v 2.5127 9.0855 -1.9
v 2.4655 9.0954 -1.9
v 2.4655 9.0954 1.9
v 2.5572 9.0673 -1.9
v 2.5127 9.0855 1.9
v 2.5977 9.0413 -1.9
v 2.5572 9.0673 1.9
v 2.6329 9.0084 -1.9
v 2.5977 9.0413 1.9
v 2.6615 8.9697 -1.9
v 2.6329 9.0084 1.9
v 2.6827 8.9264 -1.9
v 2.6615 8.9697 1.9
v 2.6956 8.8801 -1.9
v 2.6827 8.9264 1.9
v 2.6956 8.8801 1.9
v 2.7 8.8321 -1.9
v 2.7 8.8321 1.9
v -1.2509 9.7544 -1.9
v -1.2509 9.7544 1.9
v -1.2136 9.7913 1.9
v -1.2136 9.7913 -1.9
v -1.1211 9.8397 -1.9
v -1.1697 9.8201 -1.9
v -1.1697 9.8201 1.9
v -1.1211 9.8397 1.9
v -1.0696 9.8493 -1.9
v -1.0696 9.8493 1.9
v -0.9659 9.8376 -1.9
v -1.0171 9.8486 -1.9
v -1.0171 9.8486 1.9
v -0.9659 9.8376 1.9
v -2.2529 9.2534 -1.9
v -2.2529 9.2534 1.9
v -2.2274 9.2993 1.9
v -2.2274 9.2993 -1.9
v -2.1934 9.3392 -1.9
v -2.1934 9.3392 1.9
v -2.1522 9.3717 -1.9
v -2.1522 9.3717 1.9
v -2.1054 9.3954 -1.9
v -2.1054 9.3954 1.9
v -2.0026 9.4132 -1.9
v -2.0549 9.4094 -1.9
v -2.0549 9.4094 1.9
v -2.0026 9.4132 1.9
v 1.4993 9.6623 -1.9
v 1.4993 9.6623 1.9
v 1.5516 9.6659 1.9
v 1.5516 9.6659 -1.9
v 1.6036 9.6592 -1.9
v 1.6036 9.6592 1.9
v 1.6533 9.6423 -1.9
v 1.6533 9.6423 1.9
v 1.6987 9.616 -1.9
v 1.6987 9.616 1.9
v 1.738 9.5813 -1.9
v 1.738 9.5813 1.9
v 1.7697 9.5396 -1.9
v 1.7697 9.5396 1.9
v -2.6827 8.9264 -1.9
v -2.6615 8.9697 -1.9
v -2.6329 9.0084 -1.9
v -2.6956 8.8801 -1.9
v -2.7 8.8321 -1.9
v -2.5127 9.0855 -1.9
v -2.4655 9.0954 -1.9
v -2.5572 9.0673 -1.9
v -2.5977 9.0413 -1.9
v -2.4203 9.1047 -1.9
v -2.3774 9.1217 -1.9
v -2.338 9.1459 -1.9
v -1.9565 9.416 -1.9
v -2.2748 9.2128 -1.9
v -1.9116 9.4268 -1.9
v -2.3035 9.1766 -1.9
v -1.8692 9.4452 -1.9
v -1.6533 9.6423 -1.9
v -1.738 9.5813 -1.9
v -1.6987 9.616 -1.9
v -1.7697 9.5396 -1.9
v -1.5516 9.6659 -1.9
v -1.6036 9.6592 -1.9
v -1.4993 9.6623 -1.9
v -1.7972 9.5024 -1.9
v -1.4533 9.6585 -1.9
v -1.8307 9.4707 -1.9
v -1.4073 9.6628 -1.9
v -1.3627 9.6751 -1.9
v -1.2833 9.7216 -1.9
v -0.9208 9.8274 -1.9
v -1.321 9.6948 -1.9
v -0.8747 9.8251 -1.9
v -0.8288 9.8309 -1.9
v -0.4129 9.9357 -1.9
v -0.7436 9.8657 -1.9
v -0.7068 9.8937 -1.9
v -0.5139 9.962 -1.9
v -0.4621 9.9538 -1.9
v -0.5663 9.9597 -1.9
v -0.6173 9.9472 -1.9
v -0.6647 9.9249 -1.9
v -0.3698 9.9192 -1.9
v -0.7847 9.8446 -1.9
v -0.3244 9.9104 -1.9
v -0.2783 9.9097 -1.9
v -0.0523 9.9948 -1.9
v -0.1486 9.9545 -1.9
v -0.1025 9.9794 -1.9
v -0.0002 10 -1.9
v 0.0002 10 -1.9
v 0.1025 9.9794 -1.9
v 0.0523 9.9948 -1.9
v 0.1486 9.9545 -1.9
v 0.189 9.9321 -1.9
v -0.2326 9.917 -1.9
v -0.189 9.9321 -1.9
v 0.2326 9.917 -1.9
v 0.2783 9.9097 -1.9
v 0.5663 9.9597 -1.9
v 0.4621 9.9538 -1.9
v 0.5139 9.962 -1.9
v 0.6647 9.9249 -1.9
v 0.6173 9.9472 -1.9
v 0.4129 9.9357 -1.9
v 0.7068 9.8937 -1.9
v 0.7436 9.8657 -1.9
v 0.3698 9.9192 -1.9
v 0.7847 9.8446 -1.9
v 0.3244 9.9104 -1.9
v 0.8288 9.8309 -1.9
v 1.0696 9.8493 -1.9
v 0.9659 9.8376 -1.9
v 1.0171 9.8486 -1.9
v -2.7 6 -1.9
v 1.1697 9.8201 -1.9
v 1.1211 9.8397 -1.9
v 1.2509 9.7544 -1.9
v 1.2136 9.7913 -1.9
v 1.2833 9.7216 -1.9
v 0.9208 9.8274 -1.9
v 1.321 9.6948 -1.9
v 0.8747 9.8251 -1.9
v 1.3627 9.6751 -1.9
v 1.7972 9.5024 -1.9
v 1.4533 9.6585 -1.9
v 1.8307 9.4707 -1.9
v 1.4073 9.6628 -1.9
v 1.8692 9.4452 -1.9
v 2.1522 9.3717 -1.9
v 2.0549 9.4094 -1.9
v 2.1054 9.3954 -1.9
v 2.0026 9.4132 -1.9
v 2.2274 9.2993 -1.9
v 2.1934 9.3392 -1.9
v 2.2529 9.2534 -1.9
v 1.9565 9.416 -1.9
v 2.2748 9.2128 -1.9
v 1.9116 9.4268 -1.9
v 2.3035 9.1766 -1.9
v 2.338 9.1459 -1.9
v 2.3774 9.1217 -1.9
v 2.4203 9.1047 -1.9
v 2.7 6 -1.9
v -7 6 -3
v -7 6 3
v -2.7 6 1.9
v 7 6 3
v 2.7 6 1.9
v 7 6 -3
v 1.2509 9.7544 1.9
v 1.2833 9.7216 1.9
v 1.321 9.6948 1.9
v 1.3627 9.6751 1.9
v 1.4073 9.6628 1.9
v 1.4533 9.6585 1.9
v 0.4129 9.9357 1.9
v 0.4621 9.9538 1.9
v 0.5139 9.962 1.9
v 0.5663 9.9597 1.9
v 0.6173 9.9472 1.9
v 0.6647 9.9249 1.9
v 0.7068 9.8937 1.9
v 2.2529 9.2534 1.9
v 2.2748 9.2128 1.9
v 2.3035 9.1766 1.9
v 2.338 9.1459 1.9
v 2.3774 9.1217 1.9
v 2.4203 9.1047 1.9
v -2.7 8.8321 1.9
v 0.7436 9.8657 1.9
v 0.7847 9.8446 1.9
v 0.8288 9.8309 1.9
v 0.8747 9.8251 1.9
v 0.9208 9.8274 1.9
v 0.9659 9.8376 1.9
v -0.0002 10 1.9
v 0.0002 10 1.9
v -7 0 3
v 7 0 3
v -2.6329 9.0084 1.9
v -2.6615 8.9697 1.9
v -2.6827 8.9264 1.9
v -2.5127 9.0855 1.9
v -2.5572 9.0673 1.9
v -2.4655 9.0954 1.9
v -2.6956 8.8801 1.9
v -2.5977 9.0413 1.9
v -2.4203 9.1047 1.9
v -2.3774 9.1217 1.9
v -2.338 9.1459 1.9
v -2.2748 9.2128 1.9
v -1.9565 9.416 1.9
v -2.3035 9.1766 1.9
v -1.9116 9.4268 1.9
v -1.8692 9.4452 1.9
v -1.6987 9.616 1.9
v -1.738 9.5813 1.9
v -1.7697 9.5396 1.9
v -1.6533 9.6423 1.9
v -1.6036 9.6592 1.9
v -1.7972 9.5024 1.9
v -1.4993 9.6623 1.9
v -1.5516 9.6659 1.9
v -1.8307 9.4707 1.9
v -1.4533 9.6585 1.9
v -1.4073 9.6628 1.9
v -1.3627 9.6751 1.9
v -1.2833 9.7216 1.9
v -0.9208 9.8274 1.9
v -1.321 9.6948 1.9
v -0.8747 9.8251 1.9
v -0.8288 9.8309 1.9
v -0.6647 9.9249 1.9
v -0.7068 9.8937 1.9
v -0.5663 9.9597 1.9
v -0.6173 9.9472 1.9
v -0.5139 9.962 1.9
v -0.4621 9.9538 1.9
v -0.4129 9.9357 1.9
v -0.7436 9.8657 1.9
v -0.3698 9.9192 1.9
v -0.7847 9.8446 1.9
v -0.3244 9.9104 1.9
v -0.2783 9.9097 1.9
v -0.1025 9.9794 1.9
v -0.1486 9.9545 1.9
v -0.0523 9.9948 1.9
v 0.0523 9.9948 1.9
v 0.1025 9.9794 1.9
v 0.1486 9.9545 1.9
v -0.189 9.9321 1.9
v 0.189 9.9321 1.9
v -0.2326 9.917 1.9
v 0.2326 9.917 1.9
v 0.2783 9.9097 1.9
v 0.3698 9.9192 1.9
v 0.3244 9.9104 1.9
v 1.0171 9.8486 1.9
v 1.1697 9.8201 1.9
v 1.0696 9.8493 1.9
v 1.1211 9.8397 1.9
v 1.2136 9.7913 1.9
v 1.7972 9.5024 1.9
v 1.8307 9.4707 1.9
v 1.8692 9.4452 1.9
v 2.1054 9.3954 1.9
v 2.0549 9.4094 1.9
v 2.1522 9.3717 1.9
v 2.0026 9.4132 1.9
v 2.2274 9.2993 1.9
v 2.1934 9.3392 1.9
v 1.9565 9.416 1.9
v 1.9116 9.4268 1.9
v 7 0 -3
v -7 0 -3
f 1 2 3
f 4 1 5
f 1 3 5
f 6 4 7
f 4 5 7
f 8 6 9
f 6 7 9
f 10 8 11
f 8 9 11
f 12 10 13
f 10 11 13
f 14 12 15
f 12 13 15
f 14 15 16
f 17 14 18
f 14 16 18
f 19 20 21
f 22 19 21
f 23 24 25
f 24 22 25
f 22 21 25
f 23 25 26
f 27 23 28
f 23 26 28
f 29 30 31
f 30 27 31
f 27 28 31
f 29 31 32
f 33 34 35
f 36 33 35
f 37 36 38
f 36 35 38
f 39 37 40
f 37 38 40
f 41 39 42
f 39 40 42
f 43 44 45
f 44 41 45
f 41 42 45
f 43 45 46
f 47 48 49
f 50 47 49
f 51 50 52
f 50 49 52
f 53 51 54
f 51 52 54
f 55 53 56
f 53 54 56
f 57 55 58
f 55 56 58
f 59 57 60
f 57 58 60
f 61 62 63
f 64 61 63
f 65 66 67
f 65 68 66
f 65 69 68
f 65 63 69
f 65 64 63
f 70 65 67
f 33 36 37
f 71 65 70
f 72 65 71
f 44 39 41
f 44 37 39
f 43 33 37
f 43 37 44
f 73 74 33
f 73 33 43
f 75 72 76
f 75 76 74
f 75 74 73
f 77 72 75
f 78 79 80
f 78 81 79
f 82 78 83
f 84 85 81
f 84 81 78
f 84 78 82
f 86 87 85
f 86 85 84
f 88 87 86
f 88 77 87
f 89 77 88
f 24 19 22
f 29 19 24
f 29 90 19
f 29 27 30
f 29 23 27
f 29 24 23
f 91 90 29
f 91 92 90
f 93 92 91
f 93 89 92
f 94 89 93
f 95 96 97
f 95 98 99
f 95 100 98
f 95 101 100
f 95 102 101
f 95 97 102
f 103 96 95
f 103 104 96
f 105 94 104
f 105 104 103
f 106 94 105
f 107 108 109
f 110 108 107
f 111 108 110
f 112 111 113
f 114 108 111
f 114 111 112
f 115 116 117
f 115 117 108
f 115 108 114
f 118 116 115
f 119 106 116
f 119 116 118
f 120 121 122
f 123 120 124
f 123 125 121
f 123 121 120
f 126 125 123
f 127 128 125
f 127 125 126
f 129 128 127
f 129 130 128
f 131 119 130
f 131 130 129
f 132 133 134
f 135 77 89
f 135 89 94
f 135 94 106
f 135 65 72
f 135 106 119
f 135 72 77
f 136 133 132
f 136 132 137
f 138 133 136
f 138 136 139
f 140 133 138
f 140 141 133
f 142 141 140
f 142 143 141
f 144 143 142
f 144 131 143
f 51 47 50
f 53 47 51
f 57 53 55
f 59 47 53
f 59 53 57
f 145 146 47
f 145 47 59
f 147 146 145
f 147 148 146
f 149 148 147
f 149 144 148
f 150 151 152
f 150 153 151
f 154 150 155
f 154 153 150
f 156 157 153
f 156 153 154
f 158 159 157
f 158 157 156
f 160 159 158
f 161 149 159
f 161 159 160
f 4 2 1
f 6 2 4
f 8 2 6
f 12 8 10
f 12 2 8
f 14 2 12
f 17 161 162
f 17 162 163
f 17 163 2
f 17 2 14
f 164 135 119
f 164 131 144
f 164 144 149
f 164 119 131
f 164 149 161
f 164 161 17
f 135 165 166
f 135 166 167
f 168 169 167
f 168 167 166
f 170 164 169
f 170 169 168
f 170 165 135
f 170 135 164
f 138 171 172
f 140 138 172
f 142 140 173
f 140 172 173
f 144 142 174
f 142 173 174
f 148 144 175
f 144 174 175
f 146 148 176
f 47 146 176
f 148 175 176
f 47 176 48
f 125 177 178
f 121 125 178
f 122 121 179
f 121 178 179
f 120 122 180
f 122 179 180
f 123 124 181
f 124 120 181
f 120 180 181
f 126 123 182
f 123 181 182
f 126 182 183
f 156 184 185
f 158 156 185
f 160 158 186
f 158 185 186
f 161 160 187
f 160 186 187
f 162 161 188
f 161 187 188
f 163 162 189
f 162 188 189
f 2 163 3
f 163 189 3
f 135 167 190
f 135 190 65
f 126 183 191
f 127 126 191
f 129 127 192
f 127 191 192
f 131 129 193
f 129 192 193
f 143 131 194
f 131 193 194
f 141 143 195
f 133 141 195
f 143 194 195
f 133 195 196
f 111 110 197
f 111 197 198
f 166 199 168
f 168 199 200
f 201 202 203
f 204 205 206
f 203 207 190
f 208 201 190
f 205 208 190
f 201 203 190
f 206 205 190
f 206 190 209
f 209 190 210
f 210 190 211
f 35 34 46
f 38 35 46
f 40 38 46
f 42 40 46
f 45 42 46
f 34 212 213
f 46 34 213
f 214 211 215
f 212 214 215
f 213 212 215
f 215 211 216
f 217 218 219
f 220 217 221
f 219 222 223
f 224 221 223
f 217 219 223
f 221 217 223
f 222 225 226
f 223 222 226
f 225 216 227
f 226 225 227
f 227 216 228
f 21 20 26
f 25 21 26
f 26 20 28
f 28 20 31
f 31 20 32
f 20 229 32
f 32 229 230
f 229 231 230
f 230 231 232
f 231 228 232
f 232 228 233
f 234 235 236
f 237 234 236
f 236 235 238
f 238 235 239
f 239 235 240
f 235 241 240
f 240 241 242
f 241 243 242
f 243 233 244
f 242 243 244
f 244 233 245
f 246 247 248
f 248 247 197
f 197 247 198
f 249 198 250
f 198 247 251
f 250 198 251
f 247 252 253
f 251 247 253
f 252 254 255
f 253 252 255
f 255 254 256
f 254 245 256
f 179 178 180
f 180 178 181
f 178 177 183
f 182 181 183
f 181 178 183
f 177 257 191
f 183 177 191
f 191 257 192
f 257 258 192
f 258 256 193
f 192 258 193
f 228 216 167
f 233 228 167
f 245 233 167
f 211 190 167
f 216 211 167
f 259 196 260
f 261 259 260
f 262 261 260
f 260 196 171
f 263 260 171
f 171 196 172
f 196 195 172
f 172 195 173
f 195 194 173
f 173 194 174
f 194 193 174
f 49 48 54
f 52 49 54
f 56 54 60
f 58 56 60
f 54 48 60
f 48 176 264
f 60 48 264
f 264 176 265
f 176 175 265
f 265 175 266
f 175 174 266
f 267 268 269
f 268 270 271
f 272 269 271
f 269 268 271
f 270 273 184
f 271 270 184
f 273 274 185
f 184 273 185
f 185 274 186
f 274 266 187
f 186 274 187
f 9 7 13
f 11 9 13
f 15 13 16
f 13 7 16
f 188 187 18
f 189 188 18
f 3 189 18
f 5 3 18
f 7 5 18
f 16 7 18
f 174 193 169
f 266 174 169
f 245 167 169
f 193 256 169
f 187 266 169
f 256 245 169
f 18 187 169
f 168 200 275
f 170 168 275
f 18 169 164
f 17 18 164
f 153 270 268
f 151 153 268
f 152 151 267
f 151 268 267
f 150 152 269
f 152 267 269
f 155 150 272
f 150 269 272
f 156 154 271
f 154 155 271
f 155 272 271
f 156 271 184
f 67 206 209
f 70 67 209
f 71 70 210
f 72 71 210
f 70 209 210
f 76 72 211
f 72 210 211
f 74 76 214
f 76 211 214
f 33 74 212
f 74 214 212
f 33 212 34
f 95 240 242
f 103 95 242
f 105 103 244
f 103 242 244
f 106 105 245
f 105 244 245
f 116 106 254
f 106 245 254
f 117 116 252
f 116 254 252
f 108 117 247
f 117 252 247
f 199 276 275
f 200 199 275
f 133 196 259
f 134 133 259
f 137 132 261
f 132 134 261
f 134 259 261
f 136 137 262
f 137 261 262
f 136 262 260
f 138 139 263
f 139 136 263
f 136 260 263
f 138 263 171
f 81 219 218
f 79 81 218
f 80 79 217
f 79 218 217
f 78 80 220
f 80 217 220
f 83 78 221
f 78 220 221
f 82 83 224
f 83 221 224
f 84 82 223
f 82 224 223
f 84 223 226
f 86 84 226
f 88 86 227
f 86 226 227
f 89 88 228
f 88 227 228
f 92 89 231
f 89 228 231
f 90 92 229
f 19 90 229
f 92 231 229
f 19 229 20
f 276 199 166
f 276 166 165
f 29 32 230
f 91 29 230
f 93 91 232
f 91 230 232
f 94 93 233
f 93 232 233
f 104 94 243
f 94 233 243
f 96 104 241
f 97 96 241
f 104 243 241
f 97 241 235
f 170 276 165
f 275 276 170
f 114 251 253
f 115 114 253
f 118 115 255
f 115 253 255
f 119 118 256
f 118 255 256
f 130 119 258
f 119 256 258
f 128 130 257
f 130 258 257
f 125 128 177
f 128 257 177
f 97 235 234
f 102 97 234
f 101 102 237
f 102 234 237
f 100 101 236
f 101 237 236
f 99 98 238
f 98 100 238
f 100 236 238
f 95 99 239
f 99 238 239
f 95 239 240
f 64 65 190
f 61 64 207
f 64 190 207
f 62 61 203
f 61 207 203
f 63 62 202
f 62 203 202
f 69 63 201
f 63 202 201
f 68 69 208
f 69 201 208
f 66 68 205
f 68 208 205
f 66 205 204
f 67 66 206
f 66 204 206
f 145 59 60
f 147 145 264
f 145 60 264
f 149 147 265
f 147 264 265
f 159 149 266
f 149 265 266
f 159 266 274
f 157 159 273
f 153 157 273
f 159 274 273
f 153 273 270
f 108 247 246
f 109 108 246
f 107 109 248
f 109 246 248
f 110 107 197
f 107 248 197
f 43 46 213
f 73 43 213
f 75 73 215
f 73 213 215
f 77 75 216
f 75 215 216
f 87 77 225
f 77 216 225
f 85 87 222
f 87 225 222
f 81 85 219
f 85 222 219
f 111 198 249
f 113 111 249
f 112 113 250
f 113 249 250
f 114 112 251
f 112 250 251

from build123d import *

# Parameters (mm, degrees)
SKETCH1_W           = 14
SKETCH1_H           = 6
BOSS_EXTRUDE1_DEPTH = 6
SKETCH2_W           = 5.4
SKETCH2_H           = 3.8
BOSS_EXTRUDE2_DEPTH = 4
CUT_EXTRUDE1_DEPTH  = 5.9


with BuildPart() as part:
    # Sketch1 → Boss-Extrude1 (new body)
    with BuildSketch(Plane(origin=(0, 0, 0), x_dir=(1, 0, 0), z_dir=(0, 1, 0))):
        Rectangle(SKETCH1_W, SKETCH1_H)
    extrude(amount=BOSS_EXTRUDE1_DEPTH)

    # Sketch2 → Boss-Extrude2 (add)
    with BuildSketch(Plane(origin=(0, 6, 0), x_dir=(1, 0, 0), z_dir=(0, 1, 0))):
        Rectangle(SKETCH2_W, SKETCH2_H)
    extrude(amount=BOSS_EXTRUDE2_DEPTH)

    # Sketch3 → Cut-Extrude1 (cut, through all)
    with BuildSketch(Plane.XY.offset(1.9)):
        with BuildLine():
            Line((-2.7, 10), (-2.7, 8.832137002))
            ThreePointArc((-2.7, 8.832137002), (-2.632889163, 9.008389319), (-2.465548082, 9.095370387))
            ThreePointArc((-2.465548082, 9.095370387), (-2.338024057, 9.145911014), (-2.252855325, 9.253442494))
            ThreePointArc((-2.252855325, 9.253442494), (-2.152197575, 9.371653244), (-2.002596083, 9.413188261))
            ThreePointArc((-2.002596083, 9.413188261), (-1.869202273, 9.445169874), (-1.769670652, 9.539563668))
            ThreePointArc((-1.769670652, 9.539563668), (-1.653294376, 9.642336847), (-1.499320058, 9.662278599))
            ThreePointArc((-1.499320058, 9.662278599), (-1.362742465, 9.67505722), (-1.250852111, 9.754412627))
            ThreePointArc((-1.250852111, 9.754412627), (-1.121100646, 9.839678807), (-0.96585391, 9.83762575))
            ThreePointArc((-0.96585391, 9.83762575), (-0.828842644, 9.83094407), (-0.706846566, 9.893663199))
            ThreePointArc((-0.706846566, 9.893663199), (-0.566332573, 9.959705471), (-0.412939448, 9.935698945))
            ThreePointArc((-0.412939448, 9.935698945), (-0.27825335, 9.909691506), (-0.148608047, 9.954511452))
            ThreePointArc((-0.148608047, 9.954511452), (-0.077790585, 9.98837122), (-0.000160897, 9.999999997))
            Line((-0.000160897, 10), (-2.7, 10))
        make_face()
        with BuildLine():
            Line((2.7, 10), (0.000160897, 10))
            ThreePointArc((0.000160897, 9.999999997), (0.077790585, 9.98837122), (0.148608047, 9.954511452))
            ThreePointArc((0.148608047, 9.954511452), (0.27825335, 9.909691506), (0.412939448, 9.935698945))
            ThreePointArc((0.412939448, 9.935698945), (0.566332573, 9.959705471), (0.706846566, 9.893663199))
            ThreePointArc((0.706846566, 9.893663199), (0.828842644, 9.83094407), (0.96585391, 9.83762575))
            ThreePointArc((0.96585391, 9.83762575), (1.121100646, 9.839678807), (1.250852111, 9.754412627))
            ThreePointArc((1.250852111, 9.754412627), (1.362742465, 9.67505722), (1.499320058, 9.662278599))
            ThreePointArc((1.499320058, 9.662278599), (1.653294376, 9.642336847), (1.769670652, 9.539563668))
            ThreePointArc((1.769670652, 9.539563668), (1.869202273, 9.445169874), (2.002596083, 9.413188261))
            ThreePointArc((2.002596083, 9.413188261), (2.152197575, 9.371653244), (2.252855325, 9.253442494))
            ThreePointArc((2.252855325, 9.253442494), (2.338024057, 9.145911014), (2.465548082, 9.095370387))
            ThreePointArc((2.465548082, 9.095370387), (2.632889163, 9.008389319), (2.7, 8.832137002))
            Line((2.7, 8.832137002), (2.7, 10))
        make_face()
    extrude(amount=-CUT_EXTRUDE1_DEPTH, mode=Mode.SUBTRACT)


solid = part.part
